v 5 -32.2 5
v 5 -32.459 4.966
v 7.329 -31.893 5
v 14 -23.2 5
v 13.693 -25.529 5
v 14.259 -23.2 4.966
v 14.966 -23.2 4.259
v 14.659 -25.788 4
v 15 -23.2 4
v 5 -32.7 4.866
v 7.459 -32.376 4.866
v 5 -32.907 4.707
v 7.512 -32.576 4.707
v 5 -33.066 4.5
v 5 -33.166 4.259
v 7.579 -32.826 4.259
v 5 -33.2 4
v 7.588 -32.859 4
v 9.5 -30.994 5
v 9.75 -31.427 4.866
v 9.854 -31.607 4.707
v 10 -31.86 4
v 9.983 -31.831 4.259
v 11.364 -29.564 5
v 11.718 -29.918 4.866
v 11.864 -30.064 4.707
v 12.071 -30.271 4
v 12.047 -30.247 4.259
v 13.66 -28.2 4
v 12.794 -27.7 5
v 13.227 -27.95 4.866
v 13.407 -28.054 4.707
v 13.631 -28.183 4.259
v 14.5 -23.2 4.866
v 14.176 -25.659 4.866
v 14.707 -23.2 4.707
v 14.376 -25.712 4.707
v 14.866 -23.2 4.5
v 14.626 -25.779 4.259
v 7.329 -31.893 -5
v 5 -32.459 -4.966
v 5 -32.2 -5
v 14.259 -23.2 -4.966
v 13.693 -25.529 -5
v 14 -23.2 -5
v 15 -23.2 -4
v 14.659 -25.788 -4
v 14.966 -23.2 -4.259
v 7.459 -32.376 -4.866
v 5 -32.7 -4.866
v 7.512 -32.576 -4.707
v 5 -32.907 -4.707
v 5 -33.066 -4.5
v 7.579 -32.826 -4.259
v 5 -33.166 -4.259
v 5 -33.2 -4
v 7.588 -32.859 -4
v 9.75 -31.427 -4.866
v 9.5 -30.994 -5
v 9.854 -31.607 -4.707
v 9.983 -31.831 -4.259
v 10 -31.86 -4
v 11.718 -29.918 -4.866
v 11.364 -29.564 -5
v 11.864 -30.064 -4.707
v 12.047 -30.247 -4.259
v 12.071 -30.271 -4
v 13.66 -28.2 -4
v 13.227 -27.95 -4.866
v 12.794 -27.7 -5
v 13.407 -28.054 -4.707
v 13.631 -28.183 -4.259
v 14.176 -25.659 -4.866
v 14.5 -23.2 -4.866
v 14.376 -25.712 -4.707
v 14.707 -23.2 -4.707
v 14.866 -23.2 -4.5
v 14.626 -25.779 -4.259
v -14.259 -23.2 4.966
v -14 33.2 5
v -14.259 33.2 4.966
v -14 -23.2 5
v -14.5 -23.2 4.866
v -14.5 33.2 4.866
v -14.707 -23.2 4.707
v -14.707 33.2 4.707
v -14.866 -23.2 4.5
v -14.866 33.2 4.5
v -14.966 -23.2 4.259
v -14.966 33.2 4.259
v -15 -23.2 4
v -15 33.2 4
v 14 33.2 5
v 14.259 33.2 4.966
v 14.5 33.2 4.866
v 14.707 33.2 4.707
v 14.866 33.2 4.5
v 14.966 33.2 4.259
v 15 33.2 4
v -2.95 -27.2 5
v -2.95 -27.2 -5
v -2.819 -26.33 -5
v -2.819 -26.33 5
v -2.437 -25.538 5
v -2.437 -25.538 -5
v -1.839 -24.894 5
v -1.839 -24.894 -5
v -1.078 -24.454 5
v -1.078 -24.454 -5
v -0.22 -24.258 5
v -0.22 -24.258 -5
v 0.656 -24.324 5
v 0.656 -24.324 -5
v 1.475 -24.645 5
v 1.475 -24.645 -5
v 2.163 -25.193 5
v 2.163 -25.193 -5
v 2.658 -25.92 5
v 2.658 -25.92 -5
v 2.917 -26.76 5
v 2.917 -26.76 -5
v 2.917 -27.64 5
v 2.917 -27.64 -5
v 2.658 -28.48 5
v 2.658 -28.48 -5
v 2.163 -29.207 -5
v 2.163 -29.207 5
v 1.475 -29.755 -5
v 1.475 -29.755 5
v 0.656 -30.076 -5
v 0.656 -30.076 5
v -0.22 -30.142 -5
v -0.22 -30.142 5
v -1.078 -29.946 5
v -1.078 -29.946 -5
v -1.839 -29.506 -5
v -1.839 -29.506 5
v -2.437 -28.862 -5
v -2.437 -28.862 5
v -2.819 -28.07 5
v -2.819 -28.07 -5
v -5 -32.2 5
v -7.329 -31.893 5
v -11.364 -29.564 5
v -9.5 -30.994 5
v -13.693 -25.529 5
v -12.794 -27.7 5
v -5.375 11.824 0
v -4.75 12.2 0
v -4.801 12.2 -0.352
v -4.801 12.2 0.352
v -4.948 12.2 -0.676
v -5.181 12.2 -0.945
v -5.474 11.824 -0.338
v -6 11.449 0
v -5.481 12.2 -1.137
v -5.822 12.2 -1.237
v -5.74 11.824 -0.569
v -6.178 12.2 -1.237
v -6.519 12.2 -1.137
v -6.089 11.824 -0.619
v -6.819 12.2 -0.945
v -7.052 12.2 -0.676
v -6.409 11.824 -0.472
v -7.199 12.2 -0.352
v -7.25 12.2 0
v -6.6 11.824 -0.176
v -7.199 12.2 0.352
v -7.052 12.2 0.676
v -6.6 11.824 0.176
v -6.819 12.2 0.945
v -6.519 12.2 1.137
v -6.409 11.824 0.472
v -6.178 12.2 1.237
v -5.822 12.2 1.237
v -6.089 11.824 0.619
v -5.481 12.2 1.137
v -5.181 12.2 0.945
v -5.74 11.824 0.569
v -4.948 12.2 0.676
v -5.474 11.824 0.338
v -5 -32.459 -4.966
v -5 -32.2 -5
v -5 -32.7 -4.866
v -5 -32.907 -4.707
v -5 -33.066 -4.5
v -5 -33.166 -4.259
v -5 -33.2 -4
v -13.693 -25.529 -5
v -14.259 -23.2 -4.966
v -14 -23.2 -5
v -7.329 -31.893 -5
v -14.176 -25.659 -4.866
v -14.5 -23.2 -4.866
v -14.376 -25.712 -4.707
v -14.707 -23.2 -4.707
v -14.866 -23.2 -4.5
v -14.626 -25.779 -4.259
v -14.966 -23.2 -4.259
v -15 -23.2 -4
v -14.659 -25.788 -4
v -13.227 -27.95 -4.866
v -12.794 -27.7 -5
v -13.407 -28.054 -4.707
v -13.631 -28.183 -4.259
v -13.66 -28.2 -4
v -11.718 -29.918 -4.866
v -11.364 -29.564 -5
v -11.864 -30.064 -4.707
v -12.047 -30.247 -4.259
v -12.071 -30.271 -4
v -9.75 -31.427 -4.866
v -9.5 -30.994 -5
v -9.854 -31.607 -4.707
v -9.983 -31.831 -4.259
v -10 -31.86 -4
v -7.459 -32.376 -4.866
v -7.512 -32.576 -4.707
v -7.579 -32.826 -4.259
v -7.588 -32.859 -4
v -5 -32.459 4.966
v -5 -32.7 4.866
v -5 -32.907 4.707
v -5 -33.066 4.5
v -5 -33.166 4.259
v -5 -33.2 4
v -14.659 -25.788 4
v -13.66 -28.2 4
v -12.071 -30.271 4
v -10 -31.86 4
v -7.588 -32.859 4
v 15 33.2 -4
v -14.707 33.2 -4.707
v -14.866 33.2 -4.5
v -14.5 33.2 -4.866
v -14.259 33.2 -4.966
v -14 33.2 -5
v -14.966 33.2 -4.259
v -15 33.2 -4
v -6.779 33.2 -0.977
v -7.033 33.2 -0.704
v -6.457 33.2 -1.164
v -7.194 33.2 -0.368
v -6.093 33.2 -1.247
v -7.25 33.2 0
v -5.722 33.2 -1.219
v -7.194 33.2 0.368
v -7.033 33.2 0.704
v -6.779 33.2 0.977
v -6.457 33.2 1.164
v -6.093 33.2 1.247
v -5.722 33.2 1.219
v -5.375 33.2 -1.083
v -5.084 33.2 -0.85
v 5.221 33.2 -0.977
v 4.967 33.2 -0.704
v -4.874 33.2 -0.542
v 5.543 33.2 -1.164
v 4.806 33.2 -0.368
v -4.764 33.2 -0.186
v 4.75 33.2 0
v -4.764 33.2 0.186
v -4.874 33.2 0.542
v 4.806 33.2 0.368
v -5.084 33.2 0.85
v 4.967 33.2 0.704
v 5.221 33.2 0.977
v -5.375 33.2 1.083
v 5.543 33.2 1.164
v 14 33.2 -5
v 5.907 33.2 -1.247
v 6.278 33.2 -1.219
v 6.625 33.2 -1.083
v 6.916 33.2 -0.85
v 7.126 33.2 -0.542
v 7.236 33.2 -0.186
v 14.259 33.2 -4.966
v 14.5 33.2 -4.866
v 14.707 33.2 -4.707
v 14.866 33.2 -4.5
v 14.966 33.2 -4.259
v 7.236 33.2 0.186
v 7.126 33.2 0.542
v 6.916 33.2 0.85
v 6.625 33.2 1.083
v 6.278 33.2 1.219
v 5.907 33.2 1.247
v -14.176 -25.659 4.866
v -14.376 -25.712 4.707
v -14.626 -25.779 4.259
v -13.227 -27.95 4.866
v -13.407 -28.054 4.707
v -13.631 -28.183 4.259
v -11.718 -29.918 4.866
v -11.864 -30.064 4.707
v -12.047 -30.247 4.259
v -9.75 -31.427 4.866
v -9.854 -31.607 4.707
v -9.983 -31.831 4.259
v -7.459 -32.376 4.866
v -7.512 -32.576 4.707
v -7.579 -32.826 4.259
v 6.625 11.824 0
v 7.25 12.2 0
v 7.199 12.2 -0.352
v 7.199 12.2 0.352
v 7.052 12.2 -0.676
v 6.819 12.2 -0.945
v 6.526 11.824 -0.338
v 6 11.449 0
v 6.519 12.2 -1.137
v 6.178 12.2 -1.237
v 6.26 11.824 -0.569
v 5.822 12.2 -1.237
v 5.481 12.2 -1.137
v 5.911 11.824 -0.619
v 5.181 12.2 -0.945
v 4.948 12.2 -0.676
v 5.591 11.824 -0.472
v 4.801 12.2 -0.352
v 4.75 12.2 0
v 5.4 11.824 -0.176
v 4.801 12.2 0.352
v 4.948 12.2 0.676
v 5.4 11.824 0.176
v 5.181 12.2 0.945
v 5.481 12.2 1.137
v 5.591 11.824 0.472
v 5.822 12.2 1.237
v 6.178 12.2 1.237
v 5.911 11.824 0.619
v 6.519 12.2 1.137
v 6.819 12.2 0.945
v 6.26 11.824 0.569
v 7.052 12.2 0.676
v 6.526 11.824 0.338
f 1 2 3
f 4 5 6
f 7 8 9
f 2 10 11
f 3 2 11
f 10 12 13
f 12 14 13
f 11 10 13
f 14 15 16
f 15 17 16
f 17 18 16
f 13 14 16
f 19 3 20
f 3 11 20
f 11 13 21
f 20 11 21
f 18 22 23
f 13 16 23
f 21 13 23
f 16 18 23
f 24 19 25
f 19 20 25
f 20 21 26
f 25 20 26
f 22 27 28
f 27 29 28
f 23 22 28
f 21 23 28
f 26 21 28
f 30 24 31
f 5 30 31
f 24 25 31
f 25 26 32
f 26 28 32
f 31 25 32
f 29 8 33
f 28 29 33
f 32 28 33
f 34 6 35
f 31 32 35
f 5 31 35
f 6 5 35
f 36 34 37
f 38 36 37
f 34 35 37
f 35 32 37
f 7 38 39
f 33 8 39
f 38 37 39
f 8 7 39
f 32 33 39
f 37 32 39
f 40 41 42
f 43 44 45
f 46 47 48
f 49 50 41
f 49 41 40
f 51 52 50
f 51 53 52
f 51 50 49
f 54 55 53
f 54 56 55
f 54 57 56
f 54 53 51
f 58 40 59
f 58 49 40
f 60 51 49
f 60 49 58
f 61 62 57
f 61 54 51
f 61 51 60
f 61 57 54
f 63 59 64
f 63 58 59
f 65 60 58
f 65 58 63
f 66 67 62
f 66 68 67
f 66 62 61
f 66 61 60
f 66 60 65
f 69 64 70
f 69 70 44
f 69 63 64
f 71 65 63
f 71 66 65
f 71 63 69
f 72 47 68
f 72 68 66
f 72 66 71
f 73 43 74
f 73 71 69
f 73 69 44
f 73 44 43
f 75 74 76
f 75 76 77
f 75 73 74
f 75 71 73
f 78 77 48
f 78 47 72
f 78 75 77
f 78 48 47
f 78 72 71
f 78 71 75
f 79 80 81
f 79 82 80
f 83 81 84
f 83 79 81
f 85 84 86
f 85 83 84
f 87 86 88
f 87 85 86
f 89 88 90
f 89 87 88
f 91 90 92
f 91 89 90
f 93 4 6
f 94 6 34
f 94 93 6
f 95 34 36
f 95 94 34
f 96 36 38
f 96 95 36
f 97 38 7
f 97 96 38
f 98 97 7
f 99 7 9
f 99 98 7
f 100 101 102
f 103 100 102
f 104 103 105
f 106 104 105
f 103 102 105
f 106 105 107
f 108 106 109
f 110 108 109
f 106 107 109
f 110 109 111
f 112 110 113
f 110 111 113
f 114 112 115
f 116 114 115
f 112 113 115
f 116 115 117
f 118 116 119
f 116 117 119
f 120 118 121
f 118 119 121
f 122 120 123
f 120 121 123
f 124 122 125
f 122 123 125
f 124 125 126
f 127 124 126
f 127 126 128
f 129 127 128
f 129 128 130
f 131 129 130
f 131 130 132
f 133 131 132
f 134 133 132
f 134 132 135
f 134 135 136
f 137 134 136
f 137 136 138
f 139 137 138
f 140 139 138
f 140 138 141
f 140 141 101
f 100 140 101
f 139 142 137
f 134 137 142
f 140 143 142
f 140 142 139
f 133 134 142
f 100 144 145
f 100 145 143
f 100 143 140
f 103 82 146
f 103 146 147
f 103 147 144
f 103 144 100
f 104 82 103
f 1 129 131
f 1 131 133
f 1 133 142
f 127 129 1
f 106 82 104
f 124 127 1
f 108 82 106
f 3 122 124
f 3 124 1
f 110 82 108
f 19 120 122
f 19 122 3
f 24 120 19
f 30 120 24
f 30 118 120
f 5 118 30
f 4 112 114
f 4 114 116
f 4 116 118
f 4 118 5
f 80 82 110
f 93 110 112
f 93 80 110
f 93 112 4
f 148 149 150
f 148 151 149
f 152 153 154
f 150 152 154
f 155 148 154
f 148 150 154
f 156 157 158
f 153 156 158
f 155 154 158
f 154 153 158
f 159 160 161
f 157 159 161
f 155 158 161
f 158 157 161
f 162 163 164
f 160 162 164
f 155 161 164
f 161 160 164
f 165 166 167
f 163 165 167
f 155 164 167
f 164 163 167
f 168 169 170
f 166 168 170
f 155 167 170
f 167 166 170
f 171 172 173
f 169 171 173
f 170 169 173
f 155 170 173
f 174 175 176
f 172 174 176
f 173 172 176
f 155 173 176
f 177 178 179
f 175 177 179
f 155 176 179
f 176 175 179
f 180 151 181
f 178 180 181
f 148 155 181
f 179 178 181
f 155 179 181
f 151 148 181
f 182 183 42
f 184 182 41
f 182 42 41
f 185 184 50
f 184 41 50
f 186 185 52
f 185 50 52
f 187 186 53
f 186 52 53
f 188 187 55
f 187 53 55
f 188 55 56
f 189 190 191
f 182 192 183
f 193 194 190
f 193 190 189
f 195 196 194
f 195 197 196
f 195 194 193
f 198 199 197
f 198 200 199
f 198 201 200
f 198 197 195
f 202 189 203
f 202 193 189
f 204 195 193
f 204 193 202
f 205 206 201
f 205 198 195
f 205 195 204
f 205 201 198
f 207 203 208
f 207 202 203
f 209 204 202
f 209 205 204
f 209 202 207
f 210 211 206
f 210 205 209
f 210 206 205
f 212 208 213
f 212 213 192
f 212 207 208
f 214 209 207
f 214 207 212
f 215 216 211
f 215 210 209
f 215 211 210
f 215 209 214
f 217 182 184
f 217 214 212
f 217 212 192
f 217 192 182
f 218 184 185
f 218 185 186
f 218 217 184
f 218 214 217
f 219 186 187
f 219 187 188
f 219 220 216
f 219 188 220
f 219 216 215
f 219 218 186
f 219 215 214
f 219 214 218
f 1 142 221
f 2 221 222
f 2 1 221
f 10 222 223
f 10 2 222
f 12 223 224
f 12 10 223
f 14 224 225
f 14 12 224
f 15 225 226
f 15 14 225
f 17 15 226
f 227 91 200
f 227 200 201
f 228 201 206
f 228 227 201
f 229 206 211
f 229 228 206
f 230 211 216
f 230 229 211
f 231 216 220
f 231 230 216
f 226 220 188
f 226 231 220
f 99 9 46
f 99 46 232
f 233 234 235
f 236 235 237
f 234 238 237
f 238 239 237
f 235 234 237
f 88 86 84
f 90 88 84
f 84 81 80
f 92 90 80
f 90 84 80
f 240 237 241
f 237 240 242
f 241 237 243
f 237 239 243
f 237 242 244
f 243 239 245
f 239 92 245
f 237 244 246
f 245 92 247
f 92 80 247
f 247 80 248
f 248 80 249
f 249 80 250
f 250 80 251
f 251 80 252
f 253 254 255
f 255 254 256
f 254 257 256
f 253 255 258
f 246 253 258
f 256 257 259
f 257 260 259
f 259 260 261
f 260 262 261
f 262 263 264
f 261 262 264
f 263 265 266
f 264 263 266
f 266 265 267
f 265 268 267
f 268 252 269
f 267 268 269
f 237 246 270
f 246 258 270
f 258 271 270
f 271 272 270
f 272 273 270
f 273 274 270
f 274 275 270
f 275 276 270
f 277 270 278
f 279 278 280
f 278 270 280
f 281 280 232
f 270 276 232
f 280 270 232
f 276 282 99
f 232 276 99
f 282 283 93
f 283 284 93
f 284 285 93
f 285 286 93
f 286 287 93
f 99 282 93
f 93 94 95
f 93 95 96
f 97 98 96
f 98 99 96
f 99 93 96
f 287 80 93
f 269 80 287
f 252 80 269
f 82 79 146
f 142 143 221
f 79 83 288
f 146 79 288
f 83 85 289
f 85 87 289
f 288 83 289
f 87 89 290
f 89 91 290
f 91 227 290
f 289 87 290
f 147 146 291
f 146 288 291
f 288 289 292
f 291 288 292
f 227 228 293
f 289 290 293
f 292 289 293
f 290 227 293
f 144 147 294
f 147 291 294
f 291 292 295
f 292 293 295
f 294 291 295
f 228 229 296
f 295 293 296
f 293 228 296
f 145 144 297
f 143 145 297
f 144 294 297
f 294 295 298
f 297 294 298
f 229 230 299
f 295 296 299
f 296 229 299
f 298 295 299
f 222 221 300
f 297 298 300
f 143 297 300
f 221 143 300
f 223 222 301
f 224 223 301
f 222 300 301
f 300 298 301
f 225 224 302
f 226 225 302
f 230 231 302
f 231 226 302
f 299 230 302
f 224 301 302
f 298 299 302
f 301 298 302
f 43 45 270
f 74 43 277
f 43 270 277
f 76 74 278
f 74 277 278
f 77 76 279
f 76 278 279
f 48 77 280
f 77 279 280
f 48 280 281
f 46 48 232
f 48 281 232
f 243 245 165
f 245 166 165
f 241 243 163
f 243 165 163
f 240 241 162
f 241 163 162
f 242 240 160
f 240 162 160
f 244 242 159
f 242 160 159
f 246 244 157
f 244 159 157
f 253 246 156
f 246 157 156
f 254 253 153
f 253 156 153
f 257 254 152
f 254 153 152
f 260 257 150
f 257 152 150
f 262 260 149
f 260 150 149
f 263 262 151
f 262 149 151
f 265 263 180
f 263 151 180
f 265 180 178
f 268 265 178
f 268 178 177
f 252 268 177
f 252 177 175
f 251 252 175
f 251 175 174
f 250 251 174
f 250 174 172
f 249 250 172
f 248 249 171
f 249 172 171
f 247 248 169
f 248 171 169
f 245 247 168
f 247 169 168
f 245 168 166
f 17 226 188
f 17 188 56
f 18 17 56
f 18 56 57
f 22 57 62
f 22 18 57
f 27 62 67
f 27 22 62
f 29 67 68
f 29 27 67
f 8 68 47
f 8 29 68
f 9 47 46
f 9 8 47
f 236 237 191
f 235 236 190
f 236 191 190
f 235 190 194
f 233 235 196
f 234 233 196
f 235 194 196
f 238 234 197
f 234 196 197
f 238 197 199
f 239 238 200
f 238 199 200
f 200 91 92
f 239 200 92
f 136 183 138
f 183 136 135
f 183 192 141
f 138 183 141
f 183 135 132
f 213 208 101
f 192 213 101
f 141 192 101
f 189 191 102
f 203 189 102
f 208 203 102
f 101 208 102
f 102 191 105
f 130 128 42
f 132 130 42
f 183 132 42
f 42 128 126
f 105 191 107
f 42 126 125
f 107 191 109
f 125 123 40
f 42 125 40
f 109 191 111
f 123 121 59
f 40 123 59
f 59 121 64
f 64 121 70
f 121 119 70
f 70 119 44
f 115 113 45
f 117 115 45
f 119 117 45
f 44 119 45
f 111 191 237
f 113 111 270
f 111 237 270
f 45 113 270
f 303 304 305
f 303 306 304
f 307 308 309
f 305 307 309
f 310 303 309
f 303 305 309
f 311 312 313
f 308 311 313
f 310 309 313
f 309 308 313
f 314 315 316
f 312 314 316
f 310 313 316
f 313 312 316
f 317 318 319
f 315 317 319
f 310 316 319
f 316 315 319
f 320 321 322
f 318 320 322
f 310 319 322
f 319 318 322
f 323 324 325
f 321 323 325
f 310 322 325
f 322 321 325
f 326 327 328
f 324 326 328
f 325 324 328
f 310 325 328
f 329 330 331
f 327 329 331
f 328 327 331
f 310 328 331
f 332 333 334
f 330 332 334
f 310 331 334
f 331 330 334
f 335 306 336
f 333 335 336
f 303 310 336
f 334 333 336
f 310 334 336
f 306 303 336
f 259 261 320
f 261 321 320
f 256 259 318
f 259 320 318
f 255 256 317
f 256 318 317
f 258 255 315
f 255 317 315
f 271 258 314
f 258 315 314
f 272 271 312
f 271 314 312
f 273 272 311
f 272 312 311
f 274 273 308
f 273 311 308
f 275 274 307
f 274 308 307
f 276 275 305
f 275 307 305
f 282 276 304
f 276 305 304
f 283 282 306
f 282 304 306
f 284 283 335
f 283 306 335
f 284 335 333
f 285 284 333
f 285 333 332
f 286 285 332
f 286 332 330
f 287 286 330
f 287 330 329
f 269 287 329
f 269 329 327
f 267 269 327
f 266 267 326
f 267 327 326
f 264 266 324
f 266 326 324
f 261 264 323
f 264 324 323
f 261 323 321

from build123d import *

# Parameters (mm, degrees)
SKETCH1_W                 = 30
SKETCH1_H                 = 66.4
BOSS_EXTRUDE1_DEPTH       = 5
F_6_0MM_DOWEL_HOLE1_D     = 5.9
M3X0_5_TAPPED_HOLE1_D     = 2.5
M3X0_5_TAPPED_HOLE1_DEPTH = 21
M3X0_5_TAPPED_HOLE1_TIP   = 0.751075774
FILLET1_R                 = 10
FILLET2_R                 = 1


with BuildPart() as part:
    # Sketch1 → Boss-Extrude1 (new body, symmetric)
    with BuildSketch(Plane.XY):
        Rectangle(SKETCH1_W, SKETCH1_H)
    extrude(amount=BOSS_EXTRUDE1_DEPTH, both=True)

    # Ø6.0mm Dowel Hole1 (through all)
    with Locations(Plane.XY.offset(5)):
        with Locations((0, -27.2)):
            Hole(F_6_0MM_DOWEL_HOLE1_D / 2)

    # M3x0.5 Tapped Hole1
    with Locations(Plane(origin=(0, 33.2, 0), x_dir=(1, 0, 0), z_dir=(0, 1, 0))):
        with Locations((-6, 0), (6, 0)):
            Hole(M3X0_5_TAPPED_HOLE1_D / 2, depth=M3X0_5_TAPPED_HOLE1_DEPTH)
            with Locations((0, 0, -(M3X0_5_TAPPED_HOLE1_DEPTH + M3X0_5_TAPPED_HOLE1_TIP / 2))):  # 118° drill point
                Cone(0, M3X0_5_TAPPED_HOLE1_D / 2, M3X0_5_TAPPED_HOLE1_TIP, mode=Mode.SUBTRACT)

    # Fillet1
    fillet1_edges = [part.edges().sort_by_distance(p)[0] for p in [
        (15, -33.2, 0),
        (-15, -33.2, 0),
    ]]
    fillet(fillet1_edges, radius=FILLET1_R)

    # Fillet2
    fillet2_edges = [part.edges().sort_by_distance(p)[0] for p in [
        (15, 5, 5),
        (0, -33.2, -5),
        (0, -33.2, 5),
        (12.071067812, -30.271067812, -5),
        (-12.071067812, -30.271067812, -5),
        (12.071067812, -30.271067812, 5),
        (-12.071067812, -30.271067812, 5),
        (-15, 5, 5),
        (15, 5, -5),
        (-15, 5, -5),
    ]]
    fillet(fillet2_edges, radius=FILLET2_R)


solid = part.part
